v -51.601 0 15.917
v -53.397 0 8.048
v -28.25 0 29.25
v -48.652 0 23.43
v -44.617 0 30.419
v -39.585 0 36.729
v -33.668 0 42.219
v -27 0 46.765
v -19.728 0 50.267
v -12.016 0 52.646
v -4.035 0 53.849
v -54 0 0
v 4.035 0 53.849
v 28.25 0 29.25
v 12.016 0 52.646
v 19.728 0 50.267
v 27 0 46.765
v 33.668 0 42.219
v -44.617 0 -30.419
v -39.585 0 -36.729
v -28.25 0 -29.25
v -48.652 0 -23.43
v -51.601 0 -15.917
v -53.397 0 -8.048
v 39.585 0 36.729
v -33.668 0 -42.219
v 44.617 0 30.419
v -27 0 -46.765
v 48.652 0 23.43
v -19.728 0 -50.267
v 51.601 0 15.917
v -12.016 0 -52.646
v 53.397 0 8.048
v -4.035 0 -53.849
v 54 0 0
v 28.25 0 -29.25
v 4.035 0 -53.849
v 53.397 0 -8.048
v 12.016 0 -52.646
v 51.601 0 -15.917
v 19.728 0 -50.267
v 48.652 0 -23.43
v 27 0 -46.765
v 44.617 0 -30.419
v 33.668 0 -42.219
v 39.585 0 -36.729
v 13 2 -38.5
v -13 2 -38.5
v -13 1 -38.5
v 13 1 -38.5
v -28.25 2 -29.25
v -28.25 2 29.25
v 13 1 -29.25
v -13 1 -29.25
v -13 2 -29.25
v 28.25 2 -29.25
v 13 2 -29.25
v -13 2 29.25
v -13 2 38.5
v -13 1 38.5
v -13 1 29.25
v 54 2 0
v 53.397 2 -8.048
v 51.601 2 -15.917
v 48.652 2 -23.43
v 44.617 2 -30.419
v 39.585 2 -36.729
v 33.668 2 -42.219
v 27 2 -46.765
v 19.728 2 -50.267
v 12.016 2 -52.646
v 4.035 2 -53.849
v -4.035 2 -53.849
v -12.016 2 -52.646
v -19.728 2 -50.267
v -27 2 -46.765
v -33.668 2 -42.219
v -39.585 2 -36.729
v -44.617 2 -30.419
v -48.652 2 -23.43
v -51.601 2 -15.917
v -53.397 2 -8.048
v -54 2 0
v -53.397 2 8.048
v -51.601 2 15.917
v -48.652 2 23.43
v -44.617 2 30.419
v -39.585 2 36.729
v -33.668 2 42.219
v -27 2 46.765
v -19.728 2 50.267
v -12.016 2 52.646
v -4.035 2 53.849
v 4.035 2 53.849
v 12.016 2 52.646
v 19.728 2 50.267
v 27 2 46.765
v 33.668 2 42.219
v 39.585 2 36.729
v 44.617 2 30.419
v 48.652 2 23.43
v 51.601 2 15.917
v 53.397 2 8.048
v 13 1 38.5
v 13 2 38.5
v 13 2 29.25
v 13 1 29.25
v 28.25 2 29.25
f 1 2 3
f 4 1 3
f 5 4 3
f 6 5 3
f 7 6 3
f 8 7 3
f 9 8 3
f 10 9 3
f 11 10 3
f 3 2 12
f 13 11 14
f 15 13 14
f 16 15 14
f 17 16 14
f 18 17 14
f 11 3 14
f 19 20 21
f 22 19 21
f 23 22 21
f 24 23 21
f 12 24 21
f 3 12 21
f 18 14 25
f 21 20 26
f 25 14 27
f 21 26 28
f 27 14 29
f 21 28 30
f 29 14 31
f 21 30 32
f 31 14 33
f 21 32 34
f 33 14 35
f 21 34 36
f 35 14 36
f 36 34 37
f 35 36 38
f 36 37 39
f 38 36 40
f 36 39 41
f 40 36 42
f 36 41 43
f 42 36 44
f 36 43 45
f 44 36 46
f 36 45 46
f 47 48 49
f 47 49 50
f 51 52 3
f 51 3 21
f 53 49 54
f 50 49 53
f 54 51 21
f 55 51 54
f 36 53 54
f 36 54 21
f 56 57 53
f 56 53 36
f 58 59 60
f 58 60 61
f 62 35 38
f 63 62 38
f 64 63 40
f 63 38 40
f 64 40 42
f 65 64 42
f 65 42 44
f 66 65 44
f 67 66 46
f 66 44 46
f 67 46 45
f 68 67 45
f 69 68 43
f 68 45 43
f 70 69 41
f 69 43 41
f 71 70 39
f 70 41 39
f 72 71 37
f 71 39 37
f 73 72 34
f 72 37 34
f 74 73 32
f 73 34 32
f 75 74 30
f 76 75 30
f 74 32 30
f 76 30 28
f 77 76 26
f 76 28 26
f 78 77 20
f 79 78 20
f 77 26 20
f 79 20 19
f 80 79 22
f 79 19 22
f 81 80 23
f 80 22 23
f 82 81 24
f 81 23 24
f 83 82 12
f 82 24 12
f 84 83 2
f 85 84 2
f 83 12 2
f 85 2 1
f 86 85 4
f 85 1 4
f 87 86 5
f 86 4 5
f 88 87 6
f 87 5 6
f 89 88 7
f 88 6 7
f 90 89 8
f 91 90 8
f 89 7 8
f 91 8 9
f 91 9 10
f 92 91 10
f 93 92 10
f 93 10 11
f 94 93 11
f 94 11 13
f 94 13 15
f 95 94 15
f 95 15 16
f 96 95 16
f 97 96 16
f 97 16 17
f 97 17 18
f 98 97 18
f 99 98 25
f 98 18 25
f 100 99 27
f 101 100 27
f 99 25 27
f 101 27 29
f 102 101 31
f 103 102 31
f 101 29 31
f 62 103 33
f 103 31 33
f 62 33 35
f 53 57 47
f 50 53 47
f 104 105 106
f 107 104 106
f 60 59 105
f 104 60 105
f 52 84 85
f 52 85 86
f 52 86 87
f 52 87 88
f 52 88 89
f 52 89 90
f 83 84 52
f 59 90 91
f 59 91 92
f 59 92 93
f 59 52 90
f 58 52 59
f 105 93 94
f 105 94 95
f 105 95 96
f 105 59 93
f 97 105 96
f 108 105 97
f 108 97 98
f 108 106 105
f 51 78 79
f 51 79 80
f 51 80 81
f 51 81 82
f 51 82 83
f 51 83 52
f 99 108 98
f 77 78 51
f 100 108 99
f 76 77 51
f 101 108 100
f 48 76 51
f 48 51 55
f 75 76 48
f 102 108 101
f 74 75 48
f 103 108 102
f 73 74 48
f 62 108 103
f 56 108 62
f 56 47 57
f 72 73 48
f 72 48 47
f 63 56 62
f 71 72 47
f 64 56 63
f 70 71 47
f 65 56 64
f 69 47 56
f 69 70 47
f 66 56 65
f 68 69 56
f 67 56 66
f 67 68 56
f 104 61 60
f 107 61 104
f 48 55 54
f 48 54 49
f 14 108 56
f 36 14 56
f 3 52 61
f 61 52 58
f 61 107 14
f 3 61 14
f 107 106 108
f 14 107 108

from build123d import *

# Parameters (mm, degrees)
SKETCH1_R           = 54
BOSS_EXTRUDE1_DEPTH = 2
SKETCH2_W           = 56.5
SKETCH2_H           = 58.5
CUT_EXTRUDE1_DEPTH  = 2
SKETCH3_W           = 26
SKETCH3_H           = 9.25
CUT_EXTRUDE2_DEPTH  = 1


with BuildPart() as part:
    # Sketch1 → Boss-Extrude1 (new body)
    with BuildSketch(Plane(origin=(0, 0, 0), x_dir=(1, 0, 0), z_dir=(0, 1, 0))):
        Circle(SKETCH1_R)
    extrude(amount=BOSS_EXTRUDE1_DEPTH)

    # Sketch2 → Cut-Extrude1 (cut)
    with BuildSketch(Plane(origin=(0, 2, 0), x_dir=(1, 0, 0), z_dir=(0, 1, 0))):
        Rectangle(SKETCH2_W, SKETCH2_H)
    extrude(amount=-CUT_EXTRUDE1_DEPTH, mode=Mode.SUBTRACT)

    # Sketch3 → Cut-Extrude2 (cut)
    with BuildSketch(Plane(origin=(0, 2, 0), x_dir=(1, 0, 0), z_dir=(0, 1, 0))):
        with Locations((0, 33.875)):
            Rectangle(SKETCH3_W, SKETCH3_H)
        with Locations((0, -33.875)):
            Rectangle(SKETCH3_W, SKETCH3_H)
    extrude(amount=-CUT_EXTRUDE2_DEPTH, mode=Mode.SUBTRACT)


solid = part.part
